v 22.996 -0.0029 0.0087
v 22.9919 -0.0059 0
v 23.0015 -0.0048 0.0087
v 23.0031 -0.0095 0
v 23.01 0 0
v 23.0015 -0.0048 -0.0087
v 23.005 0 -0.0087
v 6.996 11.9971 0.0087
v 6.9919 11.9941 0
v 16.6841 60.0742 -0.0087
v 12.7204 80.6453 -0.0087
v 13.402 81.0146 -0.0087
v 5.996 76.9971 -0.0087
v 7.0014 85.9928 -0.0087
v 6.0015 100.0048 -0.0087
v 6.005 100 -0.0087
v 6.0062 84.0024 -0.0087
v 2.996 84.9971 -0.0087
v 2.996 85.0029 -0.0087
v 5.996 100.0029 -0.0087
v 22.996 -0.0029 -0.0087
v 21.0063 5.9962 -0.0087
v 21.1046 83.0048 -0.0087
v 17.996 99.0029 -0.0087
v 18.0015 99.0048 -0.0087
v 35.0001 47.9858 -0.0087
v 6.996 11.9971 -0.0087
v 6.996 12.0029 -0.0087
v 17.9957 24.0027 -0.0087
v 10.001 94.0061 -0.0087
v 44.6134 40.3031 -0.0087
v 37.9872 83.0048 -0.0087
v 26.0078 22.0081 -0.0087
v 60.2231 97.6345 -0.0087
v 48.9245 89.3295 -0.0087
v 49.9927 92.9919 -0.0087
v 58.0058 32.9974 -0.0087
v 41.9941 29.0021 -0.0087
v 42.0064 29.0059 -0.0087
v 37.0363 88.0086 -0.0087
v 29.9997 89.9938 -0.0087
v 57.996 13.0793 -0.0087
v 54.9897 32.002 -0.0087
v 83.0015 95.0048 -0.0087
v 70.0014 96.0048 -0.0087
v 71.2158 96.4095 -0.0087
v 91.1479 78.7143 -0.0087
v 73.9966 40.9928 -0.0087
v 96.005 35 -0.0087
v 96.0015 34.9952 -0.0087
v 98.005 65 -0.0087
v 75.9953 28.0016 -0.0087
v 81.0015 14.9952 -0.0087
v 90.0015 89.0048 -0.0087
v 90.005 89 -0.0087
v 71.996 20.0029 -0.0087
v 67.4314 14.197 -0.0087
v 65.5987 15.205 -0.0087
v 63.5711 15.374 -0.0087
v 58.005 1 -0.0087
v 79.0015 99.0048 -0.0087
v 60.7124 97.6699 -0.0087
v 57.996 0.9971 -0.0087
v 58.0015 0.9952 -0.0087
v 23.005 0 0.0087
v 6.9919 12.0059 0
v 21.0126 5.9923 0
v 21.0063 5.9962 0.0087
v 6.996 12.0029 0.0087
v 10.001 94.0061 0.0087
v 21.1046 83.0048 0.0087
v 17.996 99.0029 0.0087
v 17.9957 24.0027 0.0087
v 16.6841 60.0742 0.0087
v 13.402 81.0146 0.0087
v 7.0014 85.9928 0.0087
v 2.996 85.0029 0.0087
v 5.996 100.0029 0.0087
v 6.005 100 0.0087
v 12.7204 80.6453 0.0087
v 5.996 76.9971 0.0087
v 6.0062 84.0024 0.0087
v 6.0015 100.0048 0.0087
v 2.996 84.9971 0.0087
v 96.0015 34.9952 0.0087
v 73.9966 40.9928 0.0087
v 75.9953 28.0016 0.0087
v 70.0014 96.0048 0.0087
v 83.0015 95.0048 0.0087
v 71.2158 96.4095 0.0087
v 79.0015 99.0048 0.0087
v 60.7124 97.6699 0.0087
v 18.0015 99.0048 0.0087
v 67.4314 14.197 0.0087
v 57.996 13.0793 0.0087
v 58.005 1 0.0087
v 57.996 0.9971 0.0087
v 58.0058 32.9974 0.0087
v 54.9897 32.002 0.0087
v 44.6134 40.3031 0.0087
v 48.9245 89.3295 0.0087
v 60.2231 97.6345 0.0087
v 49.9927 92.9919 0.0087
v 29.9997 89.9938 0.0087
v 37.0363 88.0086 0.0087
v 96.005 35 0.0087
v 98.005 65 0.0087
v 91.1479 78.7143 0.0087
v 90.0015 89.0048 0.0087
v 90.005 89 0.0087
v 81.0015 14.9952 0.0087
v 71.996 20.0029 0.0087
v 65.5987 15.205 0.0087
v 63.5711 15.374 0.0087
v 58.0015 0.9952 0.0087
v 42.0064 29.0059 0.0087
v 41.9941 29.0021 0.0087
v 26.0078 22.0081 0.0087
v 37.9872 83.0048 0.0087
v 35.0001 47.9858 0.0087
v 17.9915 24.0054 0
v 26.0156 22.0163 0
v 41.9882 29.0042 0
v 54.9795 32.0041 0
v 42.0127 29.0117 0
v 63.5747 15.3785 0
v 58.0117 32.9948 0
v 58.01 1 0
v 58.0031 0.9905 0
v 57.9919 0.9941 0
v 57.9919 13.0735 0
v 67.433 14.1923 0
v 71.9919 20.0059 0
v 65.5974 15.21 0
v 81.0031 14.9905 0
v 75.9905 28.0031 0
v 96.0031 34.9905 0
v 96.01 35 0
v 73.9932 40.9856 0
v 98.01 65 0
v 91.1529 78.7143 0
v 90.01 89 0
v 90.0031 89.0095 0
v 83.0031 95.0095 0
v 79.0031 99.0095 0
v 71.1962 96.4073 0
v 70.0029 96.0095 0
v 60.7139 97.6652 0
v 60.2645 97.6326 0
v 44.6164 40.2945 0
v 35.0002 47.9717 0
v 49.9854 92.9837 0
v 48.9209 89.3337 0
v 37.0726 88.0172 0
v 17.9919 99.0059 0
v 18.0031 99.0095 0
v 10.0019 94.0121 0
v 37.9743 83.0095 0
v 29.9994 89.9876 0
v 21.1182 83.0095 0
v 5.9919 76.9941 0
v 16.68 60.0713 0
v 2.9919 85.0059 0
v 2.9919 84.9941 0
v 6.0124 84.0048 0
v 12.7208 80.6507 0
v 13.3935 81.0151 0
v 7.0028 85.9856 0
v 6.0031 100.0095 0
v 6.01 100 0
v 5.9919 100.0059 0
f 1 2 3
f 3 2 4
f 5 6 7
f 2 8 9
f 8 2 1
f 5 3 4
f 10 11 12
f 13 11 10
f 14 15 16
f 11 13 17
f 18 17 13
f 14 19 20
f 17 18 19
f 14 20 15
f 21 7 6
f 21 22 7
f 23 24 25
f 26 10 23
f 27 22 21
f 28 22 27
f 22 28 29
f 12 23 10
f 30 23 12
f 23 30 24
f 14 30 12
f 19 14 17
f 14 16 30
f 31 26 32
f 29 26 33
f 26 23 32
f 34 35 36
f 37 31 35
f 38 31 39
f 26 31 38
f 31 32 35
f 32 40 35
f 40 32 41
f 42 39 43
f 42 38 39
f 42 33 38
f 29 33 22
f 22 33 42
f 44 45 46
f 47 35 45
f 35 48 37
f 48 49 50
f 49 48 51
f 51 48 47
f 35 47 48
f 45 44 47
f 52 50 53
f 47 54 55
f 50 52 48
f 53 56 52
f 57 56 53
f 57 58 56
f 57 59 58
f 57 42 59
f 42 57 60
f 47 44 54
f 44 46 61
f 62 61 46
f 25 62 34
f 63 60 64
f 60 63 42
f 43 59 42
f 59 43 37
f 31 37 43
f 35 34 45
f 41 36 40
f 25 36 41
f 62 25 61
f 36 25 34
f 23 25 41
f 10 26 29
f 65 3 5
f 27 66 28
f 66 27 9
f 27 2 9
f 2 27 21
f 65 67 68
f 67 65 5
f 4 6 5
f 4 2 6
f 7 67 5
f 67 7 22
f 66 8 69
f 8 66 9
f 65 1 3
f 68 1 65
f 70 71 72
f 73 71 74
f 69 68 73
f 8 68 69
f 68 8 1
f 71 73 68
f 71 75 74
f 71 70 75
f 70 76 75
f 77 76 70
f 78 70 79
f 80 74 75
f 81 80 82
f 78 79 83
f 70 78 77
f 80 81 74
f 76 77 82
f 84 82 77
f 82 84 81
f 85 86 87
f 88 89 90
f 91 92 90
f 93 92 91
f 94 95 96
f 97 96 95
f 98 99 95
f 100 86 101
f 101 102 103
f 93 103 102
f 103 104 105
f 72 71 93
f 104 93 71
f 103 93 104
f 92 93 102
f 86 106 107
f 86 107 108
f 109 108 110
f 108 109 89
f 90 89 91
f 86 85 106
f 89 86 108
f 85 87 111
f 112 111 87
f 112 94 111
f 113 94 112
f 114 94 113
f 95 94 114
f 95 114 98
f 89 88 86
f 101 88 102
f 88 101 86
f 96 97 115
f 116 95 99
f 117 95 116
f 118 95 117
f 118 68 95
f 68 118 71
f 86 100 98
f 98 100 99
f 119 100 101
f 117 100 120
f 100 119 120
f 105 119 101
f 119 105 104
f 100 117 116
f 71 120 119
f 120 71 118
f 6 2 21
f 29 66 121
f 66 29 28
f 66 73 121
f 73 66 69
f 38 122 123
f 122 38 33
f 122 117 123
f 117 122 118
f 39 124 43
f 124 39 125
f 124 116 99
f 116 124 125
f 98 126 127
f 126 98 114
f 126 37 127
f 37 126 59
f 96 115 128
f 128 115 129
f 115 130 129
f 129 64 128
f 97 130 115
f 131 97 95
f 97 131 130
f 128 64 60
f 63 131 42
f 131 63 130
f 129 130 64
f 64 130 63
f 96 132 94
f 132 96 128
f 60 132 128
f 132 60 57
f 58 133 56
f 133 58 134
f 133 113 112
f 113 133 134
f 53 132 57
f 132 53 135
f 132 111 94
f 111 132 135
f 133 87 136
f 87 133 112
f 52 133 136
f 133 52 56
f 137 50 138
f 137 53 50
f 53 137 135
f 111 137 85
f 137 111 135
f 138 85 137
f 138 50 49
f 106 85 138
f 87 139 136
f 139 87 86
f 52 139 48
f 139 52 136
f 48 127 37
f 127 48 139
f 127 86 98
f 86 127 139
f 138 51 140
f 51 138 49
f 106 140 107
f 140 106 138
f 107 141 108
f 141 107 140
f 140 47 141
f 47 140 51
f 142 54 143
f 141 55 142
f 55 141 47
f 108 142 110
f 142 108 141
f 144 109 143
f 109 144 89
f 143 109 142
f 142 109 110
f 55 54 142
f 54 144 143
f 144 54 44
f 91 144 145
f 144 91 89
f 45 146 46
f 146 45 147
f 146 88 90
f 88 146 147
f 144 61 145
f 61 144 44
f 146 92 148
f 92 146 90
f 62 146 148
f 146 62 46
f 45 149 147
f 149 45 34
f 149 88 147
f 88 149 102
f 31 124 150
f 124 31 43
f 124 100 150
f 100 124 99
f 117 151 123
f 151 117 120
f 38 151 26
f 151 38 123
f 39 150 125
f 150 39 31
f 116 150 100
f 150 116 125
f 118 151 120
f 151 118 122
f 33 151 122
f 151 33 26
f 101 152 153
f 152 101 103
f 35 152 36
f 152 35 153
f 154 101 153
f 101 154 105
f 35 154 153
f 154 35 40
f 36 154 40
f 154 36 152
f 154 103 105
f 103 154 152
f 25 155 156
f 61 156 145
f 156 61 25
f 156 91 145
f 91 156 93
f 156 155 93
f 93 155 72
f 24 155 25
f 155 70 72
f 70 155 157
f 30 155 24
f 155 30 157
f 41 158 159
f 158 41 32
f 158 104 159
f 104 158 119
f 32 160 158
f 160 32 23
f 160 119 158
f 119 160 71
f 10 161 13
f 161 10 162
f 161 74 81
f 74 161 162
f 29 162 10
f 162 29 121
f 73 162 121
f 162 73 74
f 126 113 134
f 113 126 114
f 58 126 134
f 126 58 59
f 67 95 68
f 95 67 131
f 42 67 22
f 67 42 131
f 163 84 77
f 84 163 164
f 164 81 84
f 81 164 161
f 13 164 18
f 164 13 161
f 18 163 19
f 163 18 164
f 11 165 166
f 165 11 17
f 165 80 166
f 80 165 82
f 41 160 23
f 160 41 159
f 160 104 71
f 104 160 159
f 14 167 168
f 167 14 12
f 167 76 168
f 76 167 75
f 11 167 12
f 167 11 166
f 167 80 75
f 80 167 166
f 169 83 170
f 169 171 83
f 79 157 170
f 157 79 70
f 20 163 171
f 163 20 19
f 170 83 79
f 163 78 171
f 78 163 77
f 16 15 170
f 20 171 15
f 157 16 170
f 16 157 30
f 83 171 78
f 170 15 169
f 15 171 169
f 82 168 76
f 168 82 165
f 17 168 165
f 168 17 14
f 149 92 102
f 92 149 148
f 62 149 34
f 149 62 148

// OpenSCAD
color([0.19718264729666257,0.5265513877214916,0.7820972605832109]) hull(){
    translate([23,0]) sphere(0.01);
    translate([21,6]) sphere(0.01);
    translate([7,12]) sphere(0.01);
}
color([0.016540899859545988,0.2649906914184337,0.6195666266963675]) hull(){
    translate([7,12]) sphere(0.01);
    translate([21,6]) sphere(0.01);
    translate([18,24]) sphere(0.01);
}
color([0.9400622663204184,0.8580807518186289,0.33004078082379396]) hull(){
    translate([21,6]) sphere(0.01);
    translate([18,24]) sphere(0.01);
    translate([24,21]) sphere(0.01);
}
color([0.9838273149753736,0.1297919343219498,0.6092048694604357]) hull(){
    translate([21,6]) sphere(0.01);
    translate([24,21]) sphere(0.01);
    translate([32,18]) sphere(0.01);
}
color([0.4362496777237921,0.204876863896859,0.7703581377154641]) hull(){
    translate([32,18]) sphere(0.01);
    translate([24,21]) sphere(0.01);
    translate([26,22]) sphere(0.01);
}
color([0.24016059236570497,0.9925708955515705,0.45030012798788]) hull(){
    translate([32,18]) sphere(0.01);
    translate([26,22]) sphere(0.01);
    translate([42,29]) sphere(0.01);
}
color([0.6687095525163839,0.6084946124880205,0.9354113971140408]) hull(){
    translate([32,18]) sphere(0.01);
    translate([42,29]) sphere(0.01);
    translate([55,32]) sphere(0.01);
}
color([0.40170597484563164,0.9257642462472301,0.7352475143256585]) hull(){
    translate([32,18]) sphere(0.01);
    translate([55,32]) sphere(0.01);
    translate([64,14]) sphere(0.01);
}
color([0.9040805991886998,0.8303556425691195,0.04360117165228117]) hull(){
    translate([64,14]) sphere(0.01);
    translate([55,32]) sphere(0.01);
    translate([58,33]) sphere(0.01);
}
color([0.19461635406133904,0.24937487606759356,0.948798389089598]) hull(){
    translate([64,14]) sphere(0.01);
    translate([58,33]) sphere(0.01);
    translate([58,1]) sphere(0.01);
}
color([0.463582495028668,0.8326751819056648,0.9518902994268229]) hull(){
    translate([58,1]) sphere(0.01);
    translate([64,14]) sphere(0.01);
    translate([68,15]) sphere(0.01);
}
color([0.6590575290507751,0.08125165305796267,0.4650668984349794]) hull(){
    translate([68,15]) sphere(0.01);
    translate([64,14]) sphere(0.01);
    translate([72,20]) sphere(0.01);
}
color([0.7959185631816963,0.11921151794914897,0.3955919798495292]) hull(){
    translate([72,20]) sphere(0.01);
    translate([64,14]) sphere(0.01);
    translate([81,15]) sphere(0.01);
}
color([0.9677071171037346,0.6413149765805175,0.6980206654320958]) hull(){
    translate([81,15]) sphere(0.01);
    translate([72,20]) sphere(0.01);
    translate([82,26]) sphere(0.01);
}
color([0.8040097371122532,0.02969664254607307,0.6148562424214081]) hull(){
    translate([82,26]) sphere(0.01);
    translate([72,20]) sphere(0.01);
    translate([79,27]) sphere(0.01);
}
color([0.8448719577880454,0.4679553852673959,0.08973588053163917]) hull(){
    translate([79,27]) sphere(0.01);
    translate([72,20]) sphere(0.01);
    translate([76,28]) sphere(0.01);
}
color([0.4324405658485233,0.6252018299529586,0.7035550007040374]) hull(){
    translate([76,28]) sphere(0.01);
    translate([79,27]) sphere(0.01);
    translate([81,49]) sphere(0.01);
}
color([0.5393448057318809,0.2527674186168355,0.3363254213178022]) hull(){
    translate([81,49]) sphere(0.01);
    translate([79,27]) sphere(0.01);
    translate([82,26]) sphere(0.01);
}
color([0.11910676957782207,0.14794946950639198,0.11827804449452717]) hull(){
    translate([81,15]) sphere(0.01);
    translate([82,26]) sphere(0.01);
    translate([96,35]) sphere(0.01);
}
color([0.9746683368563359,0.7286099858778307,0.49602632030784344]) hull(){
    translate([96,35]) sphere(0.01);
    translate([82,26]) sphere(0.01);
    translate([81,49]) sphere(0.01);
}
color([0.10368777629760739,0.7847886997296503,0.21061420610757087]) hull(){
    translate([96,35]) sphere(0.01);
    translate([81,49]) sphere(0.01);
    translate([91,55]) sphere(0.01);
}
color([0.5535247959118038,0.46161292315131996,0.18707801641186383]) hull(){
    translate([91,55]) sphere(0.01);
    translate([81,49]) sphere(0.01);
    translate([77,50]) sphere(0.01);
}
color([0.1364153307796545,0.7835387056505961,0.10069382875703514]) hull(){
    translate([77,50]) sphere(0.01);
    translate([81,49]) sphere(0.01);
    translate([76,28]) sphere(0.01);
}
color([0.8510722137641065,0.09533324854005332,0.7119995480635104]) hull(){
    translate([77,50]) sphere(0.01);
    translate([76,28]) sphere(0.01);
    translate([74,41]) sphere(0.01);
}
color([0.9113847581011494,0.6068644804350546,0.6888686315180719]) hull(){
    translate([74,41]) sphere(0.01);
    translate([76,28]) sphere(0.01);
    translate([75,43]) sphere(0.01);
}
color([0.746768908208267,0.12345704399851087,0.5898846042296045]) hull(){
    translate([75,43]) sphere(0.01);
    translate([74,41]) sphere(0.01);
    translate([45,42]) sphere(0.01);
}
color([0.2755493590142797,0.8424163848709234,0.5575721317979958]) hull(){
    translate([45,42]) sphere(0.01);
    translate([74,41]) sphere(0.01);
    translate([44,47]) sphere(0.01);
}
color([0.8784015234124647,0.47739326970496154,0.09079989490364004]) hull(){
    translate([55,32]) sphere(0.01);
    translate([74,41]) sphere(0.01);
    translate([58,33]) sphere(0.01);
}
color([0.0566065179549472,0.6319855242897215,0.2930318592312755]) hull(){
    translate([58,33]) sphere(0.01);
    translate([74,41]) sphere(0.01);
    translate([75,43]) sphere(0.01);
}
color([0.7481288948393144,0.34215972325745514,0.10558766446580636]) hull(){
    translate([58,33]) sphere(0.01);
    translate([75,43]) sphere(0.01);
    translate([77,50]) sphere(0.01);
}
color([0.5627933790888071,0.2967678827154311,0.9643247548406795]) hull(){
    translate([58,33]) sphere(0.01);
    translate([77,50]) sphere(0.01);
    translate([80,52]) sphere(0.01);
}
color([0.8790980990945654,0.4570323327193324,0.25493813979385316]) hull(){
    translate([80,52]) sphere(0.01);
    translate([77,50]) sphere(0.01);
    translate([91,55]) sphere(0.01);
}
color([0.6412864977946658,0.9406910621679271,0.45632471025474486]) hull(){
    translate([80,52]) sphere(0.01);
    translate([91,55]) sphere(0.01);
    translate([93,72]) sphere(0.01);
}
color([0.04105125908338825,0.3309402146952306,0.23791886775277915]) hull(){
    translate([93,72]) sphere(0.01);
    translate([91,55]) sphere(0.01);
    translate([98,65]) sphere(0.01);
}
color([0.7128186152372809,0.1716993730058638,0.11442269037932928]) hull(){
    translate([98,65]) sphere(0.01);
    translate([91,55]) sphere(0.01);
    translate([96,35]) sphere(0.01);
}
color([0.8645602562139963,0.2664368674213208,0.9073883977153171]) hull(){
    translate([98,65]) sphere(0.01);
    translate([96,35]) sphere(0.01);
    translate([83,95]) sphere(0.01);
}
color([0.9965694189565097,0.13000001149551788,0.7593972705310159]) hull(){
    translate([83,95]) sphere(0.01);
    translate([96,35]) sphere(0.01);
    translate([90,89]) sphere(0.01);
}
color([0.8933230090085382,0.36427635672205216,0.32546965883778667]) hull(){
    translate([93,72]) sphere(0.01);
    translate([83,95]) sphere(0.01);
    translate([70,96]) sphere(0.01);
}
color([0.36196691821862237,0.11105994403941222,0.1072651120587198]) hull(){
    translate([70,96]) sphere(0.01);
    translate([83,95]) sphere(0.01);
    translate([79,99]) sphere(0.01);
}
color([0.4252155075596209,0.8170217823233284,0.8596572384624677]) hull(){
    translate([79,99]) sphere(0.01);
    translate([83,95]) sphere(0.01);
    translate([58,98]) sphere(0.01);
}
color([0.11253891424253948,0.053144801449230394,0.07810399678729552]) hull(){
    translate([51,97]) sphere(0.01);
    translate([58,98]) sphere(0.01);
    translate([64,91]) sphere(0.01);
}
color([0.3303189608701519,0.8878385172664008,0.9915758487852713]) hull(){
    translate([64,91]) sphere(0.01);
    translate([58,98]) sphere(0.01);
    translate([70,96]) sphere(0.01);
}
color([0.3991396240839341,0.9884733860426759,0.7073167310918903]) hull(){
    translate([64,91]) sphere(0.01);
    translate([70,96]) sphere(0.01);
    translate([93,72]) sphere(0.01);
}
color([0.4797484147145269,0.44754869723724466,0.43278340388131575]) hull(){
    translate([64,91]) sphere(0.01);
    translate([93,72]) sphere(0.01);
    translate([67,87]) sphere(0.01);
}
color([0.6410055803419278,0.6280975156939397,0.20455433969756176]) hull(){
    translate([67,87]) sphere(0.01);
    translate([93,72]) sphere(0.01);
    translate([63,74]) sphere(0.01);
}
color([0.6068611066737437,0.8672990551936495,0.06046535592946245]) hull(){
    translate([63,74]) sphere(0.01);
    translate([93,72]) sphere(0.01);
    translate([80,52]) sphere(0.01);
}
color([0.9201340265664664,0.39863450806917233,0.823054897493322]) hull(){
    translate([63,74]) sphere(0.01);
    translate([80,52]) sphere(0.01);
    translate([46,61]) sphere(0.01);
}
color([0.103427069840068,0.8111418694840618,0.11409626878991175]) hull(){
    translate([46,61]) sphere(0.01);
    translate([80,52]) sphere(0.01);
    translate([58,33]) sphere(0.01);
}
color([0.9897431084520717,0.5604580560214266,0.5536551446296145]) hull(){
    translate([46,61]) sphere(0.01);
    translate([58,33]) sphere(0.01);
    translate([44,55]) sphere(0.01);
}
color([0.5583582994701957,0.6331886763168607,0.5149853079827476]) hull(){
    translate([44,55]) sphere(0.01);
    translate([58,33]) sphere(0.01);
    translate([55,32]) sphere(0.01);
}
color([0.0013888125298527898,0.38377849381755014,0.4289771141480134]) hull(){
    translate([44,55]) sphere(0.01);
    translate([55,32]) sphere(0.01);
    translate([35,48]) sphere(0.01);
}
color([0.18571177036205377,0.9821108307487698,0.22198389178555]) hull(){
    translate([35,48]) sphere(0.01);
    translate([55,32]) sphere(0.01);
    translate([44,47]) sphere(0.01);
}
color([0.5423662419537795,0.4665368698334095,0.529817929856837]) hull(){
    translate([35,48]) sphere(0.01);
    translate([44,47]) sphere(0.01);
    translate([45,42]) sphere(0.01);
}
color([0.23113032008665235,0.6332005648478245,0.358546624467196]) hull(){
    translate([35,48]) sphere(0.01);
    translate([45,42]) sphere(0.01);
    translate([42,29]) sphere(0.01);
}
color([0.2986285326765037,0.03155815300288933,0.42200374619051706]) hull(){
    translate([32,18]) sphere(0.01);
    translate([42,29]) sphere(0.01);
    translate([26,22]) sphere(0.01);
}
color([0.5451171478512445,0.8948082271473208,0.17285101743289433]) hull(){
    translate([26,22]) sphere(0.01);
    translate([35,48]) sphere(0.01);
    translate([26,51]) sphere(0.01);
}
color([0.029101026622139314,0.8952355116300039,0.8406606607257339]) hull(){
    translate([26,51]) sphere(0.01);
    translate([35,48]) sphere(0.01);
    translate([30,57]) sphere(0.01);
}
color([0.45576943846109663,0.5386583987974967,0.7688385120264425]) hull(){
    translate([30,57]) sphere(0.01);
    translate([35,48]) sphere(0.01);
    translate([44,55]) sphere(0.01);
}
color([0.4568787242638358,0.636245118430889,0.7697764762859295]) hull(){
    translate([30,57]) sphere(0.01);
    translate([44,55]) sphere(0.01);
    translate([46,61]) sphere(0.01);
}
color([0.34232015255838355,0.3184587403347824,0.3532643490664046]) hull(){
    translate([30,57]) sphere(0.01);
    translate([46,61]) sphere(0.01);
    translate([18,58]) sphere(0.01);
}
color([0.8904939845630896,0.8870153428836475,0.8856540158607858]) hull(){
    translate([18,58]) sphere(0.01);
    translate([26,51]) sphere(0.01);
    translate([30,57]) sphere(0.01);
}
color([0.7133608687677083,0.38780414674135744,0.331987761790176]) hull(){
    translate([26,51]) sphere(0.01);
    translate([44,55]) sphere(0.01);
    translate([35,48]) sphere(0.01);
}
color([0.6694551844637135,0.049023178801574585,0.5550570217218328]) hull(){
    translate([18,58]) sphere(0.01);
    translate([46,61]) sphere(0.01);
    translate([39,67]) sphere(0.01);
}
color([0.3283570049801383,0.28029770053100345,0.08338734945476356]) hull(){
    translate([39,67]) sphere(0.01);
    translate([46,61]) sphere(0.01);
    translate([43,69]) sphere(0.01);
}
color([0.5865519708667122,0.38202982032690824,0.866963502886238]) hull(){
    translate([43,69]) sphere(0.01);
    translate([46,61]) sphere(0.01);
    translate([63,74]) sphere(0.01);
}
color([0.15462207596770516,0.18740784499858854,0.8628887369290352]) hull(){
    translate([43,69]) sphere(0.01);
    translate([63,74]) sphere(0.01);
    translate([59,71]) sphere(0.01);
}
color([0.95666403073652,0.13672749460656242,0.5241254366639385]) hull(){
    translate([59,71]) sphere(0.01);
    translate([63,74]) sphere(0.01);
    translate([67,87]) sphere(0.01);
}
color([0.5826326527205238,0.3768117287155853,0.40299368510928046]) hull(){
    translate([67,87]) sphere(0.01);
    translate([43,69]) sphere(0.01);
    translate([59,71]) sphere(0.01);
}
color([0.9942372956474195,0.25936511365213566,0.951516328577162]) hull(){
    translate([43,69]) sphere(0.01);
    translate([59,71]) sphere(0.01);
    translate([50,93]) sphere(0.01);
}
color([0.4652417603140324,0.05491100869322374,0.24993608855167704]) hull(){
    translate([50,93]) sphere(0.01);
    translate([59,71]) sphere(0.01);
    translate([64,91]) sphere(0.01);
}
color([0.12232090728325251,0.06484265692908964,0.7111278452234024]) hull(){
    translate([67,87]) sphere(0.01);
    translate([64,91]) sphere(0.01);
    translate([37,88]) sphere(0.01);
}
color([0.02965380198962897,0.9792509051362377,0.9945754945699466]) hull(){
    translate([50,93]) sphere(0.01);
    translate([64,91]) sphere(0.01);
    translate([51,97]) sphere(0.01);
}
color([0.03141501329120944,0.4550626724555813,0.7852730167407442]) hull(){
    translate([50,93]) sphere(0.01);
    translate([51,97]) sphere(0.01);
    translate([37,88]) sphere(0.01);
}
color([0.43186938629421634,0.7609829848709094,0.2767667515483062]) hull(){
    translate([37,88]) sphere(0.01);
    translate([51,97]) sphere(0.01);
    translate([31,91]) sphere(0.01);
}
color([0.4615732377170255,0.8197923109283066,0.47310763872828454]) hull(){
    translate([31,91]) sphere(0.01);
    translate([51,97]) sphere(0.01);
    translate([39,98]) sphere(0.01);
}
color([0.03809314862500979,0.5075737804895283,0.31037898819713694]) hull(){
    translate([39,98]) sphere(0.01);
    translate([51,97]) sphere(0.01);
    translate([58,98]) sphere(0.01);
}
color([0.5273775998731943,0.11867019148322078,0.7277494353539109]) hull(){
    translate([39,98]) sphere(0.01);
    translate([58,98]) sphere(0.01);
    translate([79,99]) sphere(0.01);
}
color([0.1416701971172848,0.3856808721063091,0.7425588425753336]) hull(){
    translate([39,98]) sphere(0.01);
    translate([79,99]) sphere(0.01);
    translate([18,99]) sphere(0.01);
}
color([0.056280931120550326,0.132999013036742,0.2070942525128303]) hull(){
    translate([10,94]) sphere(0.01);
    translate([18,99]) sphere(0.01);
    translate([15,91]) sphere(0.01);
}
color([0.14994018154745115,0.15503361695306728,0.750918642108121]) hull(){
    translate([15,91]) sphere(0.01);
    translate([18,99]) sphere(0.01);
    translate([22,90]) sphere(0.01);
}
color([0.9270738029032742,0.272413323807713,0.7318451747544863]) hull(){
    translate([22,90]) sphere(0.01);
    translate([18,99]) sphere(0.01);
    translate([39,98]) sphere(0.01);
}
color([0.22532432288391258,0.26137920662138814,0.5813445272419822]) hull(){
    translate([22,90]) sphere(0.01);
    translate([39,98]) sphere(0.01);
    translate([31,91]) sphere(0.01);
}
color([0.2818083410996183,0.3634307134242535,0.9552253331969711]) hull(){
    translate([22,90]) sphere(0.01);
    translate([31,91]) sphere(0.01);
    translate([30,90]) sphere(0.01);
}
color([0.047998997243986485,0.6979018083009778,0.08815358821466346]) hull(){
    translate([30,90]) sphere(0.01);
    translate([31,91]) sphere(0.01);
    translate([37,88]) sphere(0.01);
}
color([0.6958866697067958,0.12620359835460115,0.1008856027957683]) hull(){
    translate([30,90]) sphere(0.01);
    translate([37,88]) sphere(0.01);
    translate([38,83]) sphere(0.01);
}
color([0.6625444436601752,0.1613504347781617,0.05584381010596051]) hull(){
    translate([38,83]) sphere(0.01);
    translate([37,88]) sphere(0.01);
    translate([67,87]) sphere(0.01);
}
color([0.2529798044738284,0.7511304080887747,0.31446473932017394]) hull(){
    translate([38,83]) sphere(0.01);
    translate([67,87]) sphere(0.01);
    translate([43,69]) sphere(0.01);
}
color([0.627064082426501,0.25448665693317196,0.5029325444083566]) hull(){
    translate([38,83]) sphere(0.01);
    translate([43,69]) sphere(0.01);
    translate([39,67]) sphere(0.01);
}
color([0.3676565506825805,0.651521256639127,0.13337017900895198]) hull(){
    translate([38,83]) sphere(0.01);
    translate([39,67]) sphere(0.01);
    translate([20,83]) sphere(0.01);
}
color([0.837690248889771,0.3613377134095854,0.48292982350345126]) hull(){
    translate([20,83]) sphere(0.01);
    translate([39,67]) sphere(0.01);
    translate([18,58]) sphere(0.01);
}
color([0.89663529806404,0.49902627090757234,0.7537822059021138]) hull(){
    translate([20,83]) sphere(0.01);
    translate([18,58]) sphere(0.01);
    translate([6,77]) sphere(0.01);
}
color([0.22874569339663264,0.9671732241688551,0.47237870550182237]) hull(){
    translate([6,77]) sphere(0.01);
    translate([18,58]) sphere(0.01);
    translate([16,79]) sphere(0.01);
}
color([0.03911559370804696,0.4797080856488788,0.3231116898217884]) hull(){
    translate([16,79]) sphere(0.01);
    translate([18,58]) sphere(0.01);
    translate([26,51]) sphere(0.01);
}
color([0.9713615842958687,0.8273769797936081,0.8408337876201323]) hull(){
    translate([16,79]) sphere(0.01);
    translate([26,51]) sphere(0.01);
    translate([18,24]) sphere(0.01);
}
color([0.48552932436776197,0.6578686165552565,0.5442253688535058]) hull(){
    translate([18,24]) sphere(0.01);
    translate([26,51]) sphere(0.01);
    translate([24,21]) sphere(0.01);
}
color([0.5999636507260497,0.7237284007795656,0.768477840008389]) hull(){
    translate([24,21]) sphere(0.01);
    translate([26,51]) sphere(0.01);
    translate([26,22]) sphere(0.01);
}
color([0.39919497436663987,0.5025143374016644,0.025055445802980247]) hull(){
    translate([18,24]) sphere(0.01);
    translate([24,21]) sphere(0.01);
    translate([7,12]) sphere(0.01);
}
color([0.8622097066671314,0.9174531722476837,0.6143925012121764]) hull(){
    translate([7,12]) sphere(0.01);
    translate([32,18]) sphere(0.01);
    translate([21,6]) sphere(0.01);
}
color([0.11973554167709533,0.3083466376074071,0.2479170780849217]) hull(){
    translate([21,6]) sphere(0.01);
    translate([32,18]) sphere(0.01);
    translate([68,15]) sphere(0.01);
}
color([0.7251751864040653,0.7439804793975132,0.10494851561748952]) hull(){
    translate([68,15]) sphere(0.01);
    translate([32,18]) sphere(0.01);
    translate([64,14]) sphere(0.01);
}
color([0.5383843274537697,0.6652416404660696,0.8920646197270422]) hull(){
    translate([6,77]) sphere(0.01);
    translate([16,79]) sphere(0.01);
    translate([3,85]) sphere(0.01);
}
color([0.399491629479067,0.499461091602599,0.34989648961467346]) hull(){
    translate([3,85]) sphere(0.01);
    translate([16,79]) sphere(0.01);
    translate([6,84]) sphere(0.01);
}
color([0.29526278237412984,0.17057957989831074,0.9678783922865378]) hull(){
    translate([7,86]) sphere(0.01);
    translate([16,79]) sphere(0.01);
    translate([30,90]) sphere(0.01);
}
color([0.3071997968481256,0.3900899558996832,0.19649794762289108]) hull(){
    translate([30,90]) sphere(0.01);
    translate([16,79]) sphere(0.01);
    translate([6,77]) sphere(0.01);
}
color([0.8064358997750127,0.42444570195086184,0.031050167670883755]) hull(){
    translate([7,86]) sphere(0.01);
    translate([30,90]) sphere(0.01);
    translate([15,91]) sphere(0.01);
}
color([0.6335002134768022,0.12671404771886274,0.04265135790798624]) hull(){
    translate([15,91]) sphere(0.01);
    translate([30,90]) sphere(0.01);
    translate([22,90]) sphere(0.01);
}
color([0.44063116821149884,0.2248672432039669,0.4444501373738342]) hull(){
    translate([7,86]) sphere(0.01);
    translate([15,91]) sphere(0.01);
    translate([10,94]) sphere(0.01);
}
color([0.7597844899814927,0.4424780285840133,0.5818398356761626]) hull(){
    translate([6,100]) sphere(0.01);
    translate([10,94]) sphere(0.01);
    translate([3,85]) sphere(0.01);
}
color([0.697164425779396,0.3473733746720753,0.27012334513661285]) hull(){
    translate([6,84]) sphere(0.01);
    translate([10,94]) sphere(0.01);
    translate([7,86]) sphere(0.01);
}
color([0.2525436783838323,0.549766421603873,0.21648522187020935]) hull(){
    translate([3,85]) sphere(0.01);
    translate([10,94]) sphere(0.01);
    translate([6,84]) sphere(0.01);
}
color([0.8972875486880917,0.011626858068686796,0.14621658954786865]) hull(){
    translate([79,99]) sphere(0.01);
    translate([18,99]) sphere(0.01);
    translate([10,94]) sphere(0.01);
}
